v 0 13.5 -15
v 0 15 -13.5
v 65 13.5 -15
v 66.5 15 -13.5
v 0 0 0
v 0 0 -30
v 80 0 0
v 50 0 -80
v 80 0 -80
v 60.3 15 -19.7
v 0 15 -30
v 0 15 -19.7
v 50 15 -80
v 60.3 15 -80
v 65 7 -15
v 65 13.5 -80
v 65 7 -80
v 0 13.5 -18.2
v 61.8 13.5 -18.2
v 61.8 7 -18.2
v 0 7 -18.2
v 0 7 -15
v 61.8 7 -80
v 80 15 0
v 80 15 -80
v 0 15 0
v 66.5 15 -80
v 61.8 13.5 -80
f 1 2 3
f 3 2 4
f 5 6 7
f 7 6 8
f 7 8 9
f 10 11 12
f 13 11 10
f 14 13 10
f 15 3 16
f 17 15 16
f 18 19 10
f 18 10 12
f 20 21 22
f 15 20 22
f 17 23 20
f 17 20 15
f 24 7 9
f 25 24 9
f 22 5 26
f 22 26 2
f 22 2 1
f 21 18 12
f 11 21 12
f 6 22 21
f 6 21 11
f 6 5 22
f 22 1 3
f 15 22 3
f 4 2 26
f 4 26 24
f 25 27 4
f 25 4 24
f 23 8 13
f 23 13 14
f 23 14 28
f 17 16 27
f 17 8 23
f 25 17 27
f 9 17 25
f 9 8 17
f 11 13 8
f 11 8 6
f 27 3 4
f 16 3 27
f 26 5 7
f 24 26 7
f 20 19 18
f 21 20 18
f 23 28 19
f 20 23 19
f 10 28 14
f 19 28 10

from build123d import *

# Parameters (mm, degrees)
SKETCH1_W           = 80
SKETCH1_H           = 80
BOSS_EXTRUDE1_DEPTH = 15
CUT_EXTRUDE2_DEPTH  = 8
CHAMFER3_SIZE       = 1.5
CUT_EXTRUDE3_DEPTH  = 115.127122105


with BuildPart() as part:
    # Sketch1 → Boss-Extrude1 (new body)
    with BuildSketch(Plane(origin=(0, 0, 0), x_dir=(1, 0, 0), z_dir=(0, 1, 0))):
        with Locations((40, 40)):
            Rectangle(SKETCH1_W, SKETCH1_H)
    extrude(amount=BOSS_EXTRUDE1_DEPTH)

    # Sketch3 → Cut-Extrude2 (cut)
    with BuildSketch(Plane(origin=(0, 15, 0), x_dir=(1, 0, 0), z_dir=(0, 1, 0))):
        Polygon((65, 80), (61.8, 80), (61.8, 18.2), (0, 18.2), (0, 15), (65, 15), align=None)
    extrude(amount=-CUT_EXTRUDE2_DEPTH, mode=Mode.SUBTRACT)

    # Chamfer3
    chamfer3_edges = [part.edges().sort_by_distance(p)[0] for p in [
        (65, 15, -47.5),
        (61.8, 15, -49.1),
        (30.9, 15, -18.2),
        (32.5, 15, -15),
    ]]
    chamfer(chamfer3_edges, length=CHAMFER3_SIZE)

    # Sketch4 → Cut-Extrude3 (cut, through all)
    with BuildSketch(Plane(origin=(0, 15, 0), x_dir=(1, 0, 0), z_dir=(0, 1, 0))):
        Polygon((0, 80), (50, 80), (0, 30), align=None)
    extrude(amount=-CUT_EXTRUDE3_DEPTH, mode=Mode.SUBTRACT)


solid = part.part
